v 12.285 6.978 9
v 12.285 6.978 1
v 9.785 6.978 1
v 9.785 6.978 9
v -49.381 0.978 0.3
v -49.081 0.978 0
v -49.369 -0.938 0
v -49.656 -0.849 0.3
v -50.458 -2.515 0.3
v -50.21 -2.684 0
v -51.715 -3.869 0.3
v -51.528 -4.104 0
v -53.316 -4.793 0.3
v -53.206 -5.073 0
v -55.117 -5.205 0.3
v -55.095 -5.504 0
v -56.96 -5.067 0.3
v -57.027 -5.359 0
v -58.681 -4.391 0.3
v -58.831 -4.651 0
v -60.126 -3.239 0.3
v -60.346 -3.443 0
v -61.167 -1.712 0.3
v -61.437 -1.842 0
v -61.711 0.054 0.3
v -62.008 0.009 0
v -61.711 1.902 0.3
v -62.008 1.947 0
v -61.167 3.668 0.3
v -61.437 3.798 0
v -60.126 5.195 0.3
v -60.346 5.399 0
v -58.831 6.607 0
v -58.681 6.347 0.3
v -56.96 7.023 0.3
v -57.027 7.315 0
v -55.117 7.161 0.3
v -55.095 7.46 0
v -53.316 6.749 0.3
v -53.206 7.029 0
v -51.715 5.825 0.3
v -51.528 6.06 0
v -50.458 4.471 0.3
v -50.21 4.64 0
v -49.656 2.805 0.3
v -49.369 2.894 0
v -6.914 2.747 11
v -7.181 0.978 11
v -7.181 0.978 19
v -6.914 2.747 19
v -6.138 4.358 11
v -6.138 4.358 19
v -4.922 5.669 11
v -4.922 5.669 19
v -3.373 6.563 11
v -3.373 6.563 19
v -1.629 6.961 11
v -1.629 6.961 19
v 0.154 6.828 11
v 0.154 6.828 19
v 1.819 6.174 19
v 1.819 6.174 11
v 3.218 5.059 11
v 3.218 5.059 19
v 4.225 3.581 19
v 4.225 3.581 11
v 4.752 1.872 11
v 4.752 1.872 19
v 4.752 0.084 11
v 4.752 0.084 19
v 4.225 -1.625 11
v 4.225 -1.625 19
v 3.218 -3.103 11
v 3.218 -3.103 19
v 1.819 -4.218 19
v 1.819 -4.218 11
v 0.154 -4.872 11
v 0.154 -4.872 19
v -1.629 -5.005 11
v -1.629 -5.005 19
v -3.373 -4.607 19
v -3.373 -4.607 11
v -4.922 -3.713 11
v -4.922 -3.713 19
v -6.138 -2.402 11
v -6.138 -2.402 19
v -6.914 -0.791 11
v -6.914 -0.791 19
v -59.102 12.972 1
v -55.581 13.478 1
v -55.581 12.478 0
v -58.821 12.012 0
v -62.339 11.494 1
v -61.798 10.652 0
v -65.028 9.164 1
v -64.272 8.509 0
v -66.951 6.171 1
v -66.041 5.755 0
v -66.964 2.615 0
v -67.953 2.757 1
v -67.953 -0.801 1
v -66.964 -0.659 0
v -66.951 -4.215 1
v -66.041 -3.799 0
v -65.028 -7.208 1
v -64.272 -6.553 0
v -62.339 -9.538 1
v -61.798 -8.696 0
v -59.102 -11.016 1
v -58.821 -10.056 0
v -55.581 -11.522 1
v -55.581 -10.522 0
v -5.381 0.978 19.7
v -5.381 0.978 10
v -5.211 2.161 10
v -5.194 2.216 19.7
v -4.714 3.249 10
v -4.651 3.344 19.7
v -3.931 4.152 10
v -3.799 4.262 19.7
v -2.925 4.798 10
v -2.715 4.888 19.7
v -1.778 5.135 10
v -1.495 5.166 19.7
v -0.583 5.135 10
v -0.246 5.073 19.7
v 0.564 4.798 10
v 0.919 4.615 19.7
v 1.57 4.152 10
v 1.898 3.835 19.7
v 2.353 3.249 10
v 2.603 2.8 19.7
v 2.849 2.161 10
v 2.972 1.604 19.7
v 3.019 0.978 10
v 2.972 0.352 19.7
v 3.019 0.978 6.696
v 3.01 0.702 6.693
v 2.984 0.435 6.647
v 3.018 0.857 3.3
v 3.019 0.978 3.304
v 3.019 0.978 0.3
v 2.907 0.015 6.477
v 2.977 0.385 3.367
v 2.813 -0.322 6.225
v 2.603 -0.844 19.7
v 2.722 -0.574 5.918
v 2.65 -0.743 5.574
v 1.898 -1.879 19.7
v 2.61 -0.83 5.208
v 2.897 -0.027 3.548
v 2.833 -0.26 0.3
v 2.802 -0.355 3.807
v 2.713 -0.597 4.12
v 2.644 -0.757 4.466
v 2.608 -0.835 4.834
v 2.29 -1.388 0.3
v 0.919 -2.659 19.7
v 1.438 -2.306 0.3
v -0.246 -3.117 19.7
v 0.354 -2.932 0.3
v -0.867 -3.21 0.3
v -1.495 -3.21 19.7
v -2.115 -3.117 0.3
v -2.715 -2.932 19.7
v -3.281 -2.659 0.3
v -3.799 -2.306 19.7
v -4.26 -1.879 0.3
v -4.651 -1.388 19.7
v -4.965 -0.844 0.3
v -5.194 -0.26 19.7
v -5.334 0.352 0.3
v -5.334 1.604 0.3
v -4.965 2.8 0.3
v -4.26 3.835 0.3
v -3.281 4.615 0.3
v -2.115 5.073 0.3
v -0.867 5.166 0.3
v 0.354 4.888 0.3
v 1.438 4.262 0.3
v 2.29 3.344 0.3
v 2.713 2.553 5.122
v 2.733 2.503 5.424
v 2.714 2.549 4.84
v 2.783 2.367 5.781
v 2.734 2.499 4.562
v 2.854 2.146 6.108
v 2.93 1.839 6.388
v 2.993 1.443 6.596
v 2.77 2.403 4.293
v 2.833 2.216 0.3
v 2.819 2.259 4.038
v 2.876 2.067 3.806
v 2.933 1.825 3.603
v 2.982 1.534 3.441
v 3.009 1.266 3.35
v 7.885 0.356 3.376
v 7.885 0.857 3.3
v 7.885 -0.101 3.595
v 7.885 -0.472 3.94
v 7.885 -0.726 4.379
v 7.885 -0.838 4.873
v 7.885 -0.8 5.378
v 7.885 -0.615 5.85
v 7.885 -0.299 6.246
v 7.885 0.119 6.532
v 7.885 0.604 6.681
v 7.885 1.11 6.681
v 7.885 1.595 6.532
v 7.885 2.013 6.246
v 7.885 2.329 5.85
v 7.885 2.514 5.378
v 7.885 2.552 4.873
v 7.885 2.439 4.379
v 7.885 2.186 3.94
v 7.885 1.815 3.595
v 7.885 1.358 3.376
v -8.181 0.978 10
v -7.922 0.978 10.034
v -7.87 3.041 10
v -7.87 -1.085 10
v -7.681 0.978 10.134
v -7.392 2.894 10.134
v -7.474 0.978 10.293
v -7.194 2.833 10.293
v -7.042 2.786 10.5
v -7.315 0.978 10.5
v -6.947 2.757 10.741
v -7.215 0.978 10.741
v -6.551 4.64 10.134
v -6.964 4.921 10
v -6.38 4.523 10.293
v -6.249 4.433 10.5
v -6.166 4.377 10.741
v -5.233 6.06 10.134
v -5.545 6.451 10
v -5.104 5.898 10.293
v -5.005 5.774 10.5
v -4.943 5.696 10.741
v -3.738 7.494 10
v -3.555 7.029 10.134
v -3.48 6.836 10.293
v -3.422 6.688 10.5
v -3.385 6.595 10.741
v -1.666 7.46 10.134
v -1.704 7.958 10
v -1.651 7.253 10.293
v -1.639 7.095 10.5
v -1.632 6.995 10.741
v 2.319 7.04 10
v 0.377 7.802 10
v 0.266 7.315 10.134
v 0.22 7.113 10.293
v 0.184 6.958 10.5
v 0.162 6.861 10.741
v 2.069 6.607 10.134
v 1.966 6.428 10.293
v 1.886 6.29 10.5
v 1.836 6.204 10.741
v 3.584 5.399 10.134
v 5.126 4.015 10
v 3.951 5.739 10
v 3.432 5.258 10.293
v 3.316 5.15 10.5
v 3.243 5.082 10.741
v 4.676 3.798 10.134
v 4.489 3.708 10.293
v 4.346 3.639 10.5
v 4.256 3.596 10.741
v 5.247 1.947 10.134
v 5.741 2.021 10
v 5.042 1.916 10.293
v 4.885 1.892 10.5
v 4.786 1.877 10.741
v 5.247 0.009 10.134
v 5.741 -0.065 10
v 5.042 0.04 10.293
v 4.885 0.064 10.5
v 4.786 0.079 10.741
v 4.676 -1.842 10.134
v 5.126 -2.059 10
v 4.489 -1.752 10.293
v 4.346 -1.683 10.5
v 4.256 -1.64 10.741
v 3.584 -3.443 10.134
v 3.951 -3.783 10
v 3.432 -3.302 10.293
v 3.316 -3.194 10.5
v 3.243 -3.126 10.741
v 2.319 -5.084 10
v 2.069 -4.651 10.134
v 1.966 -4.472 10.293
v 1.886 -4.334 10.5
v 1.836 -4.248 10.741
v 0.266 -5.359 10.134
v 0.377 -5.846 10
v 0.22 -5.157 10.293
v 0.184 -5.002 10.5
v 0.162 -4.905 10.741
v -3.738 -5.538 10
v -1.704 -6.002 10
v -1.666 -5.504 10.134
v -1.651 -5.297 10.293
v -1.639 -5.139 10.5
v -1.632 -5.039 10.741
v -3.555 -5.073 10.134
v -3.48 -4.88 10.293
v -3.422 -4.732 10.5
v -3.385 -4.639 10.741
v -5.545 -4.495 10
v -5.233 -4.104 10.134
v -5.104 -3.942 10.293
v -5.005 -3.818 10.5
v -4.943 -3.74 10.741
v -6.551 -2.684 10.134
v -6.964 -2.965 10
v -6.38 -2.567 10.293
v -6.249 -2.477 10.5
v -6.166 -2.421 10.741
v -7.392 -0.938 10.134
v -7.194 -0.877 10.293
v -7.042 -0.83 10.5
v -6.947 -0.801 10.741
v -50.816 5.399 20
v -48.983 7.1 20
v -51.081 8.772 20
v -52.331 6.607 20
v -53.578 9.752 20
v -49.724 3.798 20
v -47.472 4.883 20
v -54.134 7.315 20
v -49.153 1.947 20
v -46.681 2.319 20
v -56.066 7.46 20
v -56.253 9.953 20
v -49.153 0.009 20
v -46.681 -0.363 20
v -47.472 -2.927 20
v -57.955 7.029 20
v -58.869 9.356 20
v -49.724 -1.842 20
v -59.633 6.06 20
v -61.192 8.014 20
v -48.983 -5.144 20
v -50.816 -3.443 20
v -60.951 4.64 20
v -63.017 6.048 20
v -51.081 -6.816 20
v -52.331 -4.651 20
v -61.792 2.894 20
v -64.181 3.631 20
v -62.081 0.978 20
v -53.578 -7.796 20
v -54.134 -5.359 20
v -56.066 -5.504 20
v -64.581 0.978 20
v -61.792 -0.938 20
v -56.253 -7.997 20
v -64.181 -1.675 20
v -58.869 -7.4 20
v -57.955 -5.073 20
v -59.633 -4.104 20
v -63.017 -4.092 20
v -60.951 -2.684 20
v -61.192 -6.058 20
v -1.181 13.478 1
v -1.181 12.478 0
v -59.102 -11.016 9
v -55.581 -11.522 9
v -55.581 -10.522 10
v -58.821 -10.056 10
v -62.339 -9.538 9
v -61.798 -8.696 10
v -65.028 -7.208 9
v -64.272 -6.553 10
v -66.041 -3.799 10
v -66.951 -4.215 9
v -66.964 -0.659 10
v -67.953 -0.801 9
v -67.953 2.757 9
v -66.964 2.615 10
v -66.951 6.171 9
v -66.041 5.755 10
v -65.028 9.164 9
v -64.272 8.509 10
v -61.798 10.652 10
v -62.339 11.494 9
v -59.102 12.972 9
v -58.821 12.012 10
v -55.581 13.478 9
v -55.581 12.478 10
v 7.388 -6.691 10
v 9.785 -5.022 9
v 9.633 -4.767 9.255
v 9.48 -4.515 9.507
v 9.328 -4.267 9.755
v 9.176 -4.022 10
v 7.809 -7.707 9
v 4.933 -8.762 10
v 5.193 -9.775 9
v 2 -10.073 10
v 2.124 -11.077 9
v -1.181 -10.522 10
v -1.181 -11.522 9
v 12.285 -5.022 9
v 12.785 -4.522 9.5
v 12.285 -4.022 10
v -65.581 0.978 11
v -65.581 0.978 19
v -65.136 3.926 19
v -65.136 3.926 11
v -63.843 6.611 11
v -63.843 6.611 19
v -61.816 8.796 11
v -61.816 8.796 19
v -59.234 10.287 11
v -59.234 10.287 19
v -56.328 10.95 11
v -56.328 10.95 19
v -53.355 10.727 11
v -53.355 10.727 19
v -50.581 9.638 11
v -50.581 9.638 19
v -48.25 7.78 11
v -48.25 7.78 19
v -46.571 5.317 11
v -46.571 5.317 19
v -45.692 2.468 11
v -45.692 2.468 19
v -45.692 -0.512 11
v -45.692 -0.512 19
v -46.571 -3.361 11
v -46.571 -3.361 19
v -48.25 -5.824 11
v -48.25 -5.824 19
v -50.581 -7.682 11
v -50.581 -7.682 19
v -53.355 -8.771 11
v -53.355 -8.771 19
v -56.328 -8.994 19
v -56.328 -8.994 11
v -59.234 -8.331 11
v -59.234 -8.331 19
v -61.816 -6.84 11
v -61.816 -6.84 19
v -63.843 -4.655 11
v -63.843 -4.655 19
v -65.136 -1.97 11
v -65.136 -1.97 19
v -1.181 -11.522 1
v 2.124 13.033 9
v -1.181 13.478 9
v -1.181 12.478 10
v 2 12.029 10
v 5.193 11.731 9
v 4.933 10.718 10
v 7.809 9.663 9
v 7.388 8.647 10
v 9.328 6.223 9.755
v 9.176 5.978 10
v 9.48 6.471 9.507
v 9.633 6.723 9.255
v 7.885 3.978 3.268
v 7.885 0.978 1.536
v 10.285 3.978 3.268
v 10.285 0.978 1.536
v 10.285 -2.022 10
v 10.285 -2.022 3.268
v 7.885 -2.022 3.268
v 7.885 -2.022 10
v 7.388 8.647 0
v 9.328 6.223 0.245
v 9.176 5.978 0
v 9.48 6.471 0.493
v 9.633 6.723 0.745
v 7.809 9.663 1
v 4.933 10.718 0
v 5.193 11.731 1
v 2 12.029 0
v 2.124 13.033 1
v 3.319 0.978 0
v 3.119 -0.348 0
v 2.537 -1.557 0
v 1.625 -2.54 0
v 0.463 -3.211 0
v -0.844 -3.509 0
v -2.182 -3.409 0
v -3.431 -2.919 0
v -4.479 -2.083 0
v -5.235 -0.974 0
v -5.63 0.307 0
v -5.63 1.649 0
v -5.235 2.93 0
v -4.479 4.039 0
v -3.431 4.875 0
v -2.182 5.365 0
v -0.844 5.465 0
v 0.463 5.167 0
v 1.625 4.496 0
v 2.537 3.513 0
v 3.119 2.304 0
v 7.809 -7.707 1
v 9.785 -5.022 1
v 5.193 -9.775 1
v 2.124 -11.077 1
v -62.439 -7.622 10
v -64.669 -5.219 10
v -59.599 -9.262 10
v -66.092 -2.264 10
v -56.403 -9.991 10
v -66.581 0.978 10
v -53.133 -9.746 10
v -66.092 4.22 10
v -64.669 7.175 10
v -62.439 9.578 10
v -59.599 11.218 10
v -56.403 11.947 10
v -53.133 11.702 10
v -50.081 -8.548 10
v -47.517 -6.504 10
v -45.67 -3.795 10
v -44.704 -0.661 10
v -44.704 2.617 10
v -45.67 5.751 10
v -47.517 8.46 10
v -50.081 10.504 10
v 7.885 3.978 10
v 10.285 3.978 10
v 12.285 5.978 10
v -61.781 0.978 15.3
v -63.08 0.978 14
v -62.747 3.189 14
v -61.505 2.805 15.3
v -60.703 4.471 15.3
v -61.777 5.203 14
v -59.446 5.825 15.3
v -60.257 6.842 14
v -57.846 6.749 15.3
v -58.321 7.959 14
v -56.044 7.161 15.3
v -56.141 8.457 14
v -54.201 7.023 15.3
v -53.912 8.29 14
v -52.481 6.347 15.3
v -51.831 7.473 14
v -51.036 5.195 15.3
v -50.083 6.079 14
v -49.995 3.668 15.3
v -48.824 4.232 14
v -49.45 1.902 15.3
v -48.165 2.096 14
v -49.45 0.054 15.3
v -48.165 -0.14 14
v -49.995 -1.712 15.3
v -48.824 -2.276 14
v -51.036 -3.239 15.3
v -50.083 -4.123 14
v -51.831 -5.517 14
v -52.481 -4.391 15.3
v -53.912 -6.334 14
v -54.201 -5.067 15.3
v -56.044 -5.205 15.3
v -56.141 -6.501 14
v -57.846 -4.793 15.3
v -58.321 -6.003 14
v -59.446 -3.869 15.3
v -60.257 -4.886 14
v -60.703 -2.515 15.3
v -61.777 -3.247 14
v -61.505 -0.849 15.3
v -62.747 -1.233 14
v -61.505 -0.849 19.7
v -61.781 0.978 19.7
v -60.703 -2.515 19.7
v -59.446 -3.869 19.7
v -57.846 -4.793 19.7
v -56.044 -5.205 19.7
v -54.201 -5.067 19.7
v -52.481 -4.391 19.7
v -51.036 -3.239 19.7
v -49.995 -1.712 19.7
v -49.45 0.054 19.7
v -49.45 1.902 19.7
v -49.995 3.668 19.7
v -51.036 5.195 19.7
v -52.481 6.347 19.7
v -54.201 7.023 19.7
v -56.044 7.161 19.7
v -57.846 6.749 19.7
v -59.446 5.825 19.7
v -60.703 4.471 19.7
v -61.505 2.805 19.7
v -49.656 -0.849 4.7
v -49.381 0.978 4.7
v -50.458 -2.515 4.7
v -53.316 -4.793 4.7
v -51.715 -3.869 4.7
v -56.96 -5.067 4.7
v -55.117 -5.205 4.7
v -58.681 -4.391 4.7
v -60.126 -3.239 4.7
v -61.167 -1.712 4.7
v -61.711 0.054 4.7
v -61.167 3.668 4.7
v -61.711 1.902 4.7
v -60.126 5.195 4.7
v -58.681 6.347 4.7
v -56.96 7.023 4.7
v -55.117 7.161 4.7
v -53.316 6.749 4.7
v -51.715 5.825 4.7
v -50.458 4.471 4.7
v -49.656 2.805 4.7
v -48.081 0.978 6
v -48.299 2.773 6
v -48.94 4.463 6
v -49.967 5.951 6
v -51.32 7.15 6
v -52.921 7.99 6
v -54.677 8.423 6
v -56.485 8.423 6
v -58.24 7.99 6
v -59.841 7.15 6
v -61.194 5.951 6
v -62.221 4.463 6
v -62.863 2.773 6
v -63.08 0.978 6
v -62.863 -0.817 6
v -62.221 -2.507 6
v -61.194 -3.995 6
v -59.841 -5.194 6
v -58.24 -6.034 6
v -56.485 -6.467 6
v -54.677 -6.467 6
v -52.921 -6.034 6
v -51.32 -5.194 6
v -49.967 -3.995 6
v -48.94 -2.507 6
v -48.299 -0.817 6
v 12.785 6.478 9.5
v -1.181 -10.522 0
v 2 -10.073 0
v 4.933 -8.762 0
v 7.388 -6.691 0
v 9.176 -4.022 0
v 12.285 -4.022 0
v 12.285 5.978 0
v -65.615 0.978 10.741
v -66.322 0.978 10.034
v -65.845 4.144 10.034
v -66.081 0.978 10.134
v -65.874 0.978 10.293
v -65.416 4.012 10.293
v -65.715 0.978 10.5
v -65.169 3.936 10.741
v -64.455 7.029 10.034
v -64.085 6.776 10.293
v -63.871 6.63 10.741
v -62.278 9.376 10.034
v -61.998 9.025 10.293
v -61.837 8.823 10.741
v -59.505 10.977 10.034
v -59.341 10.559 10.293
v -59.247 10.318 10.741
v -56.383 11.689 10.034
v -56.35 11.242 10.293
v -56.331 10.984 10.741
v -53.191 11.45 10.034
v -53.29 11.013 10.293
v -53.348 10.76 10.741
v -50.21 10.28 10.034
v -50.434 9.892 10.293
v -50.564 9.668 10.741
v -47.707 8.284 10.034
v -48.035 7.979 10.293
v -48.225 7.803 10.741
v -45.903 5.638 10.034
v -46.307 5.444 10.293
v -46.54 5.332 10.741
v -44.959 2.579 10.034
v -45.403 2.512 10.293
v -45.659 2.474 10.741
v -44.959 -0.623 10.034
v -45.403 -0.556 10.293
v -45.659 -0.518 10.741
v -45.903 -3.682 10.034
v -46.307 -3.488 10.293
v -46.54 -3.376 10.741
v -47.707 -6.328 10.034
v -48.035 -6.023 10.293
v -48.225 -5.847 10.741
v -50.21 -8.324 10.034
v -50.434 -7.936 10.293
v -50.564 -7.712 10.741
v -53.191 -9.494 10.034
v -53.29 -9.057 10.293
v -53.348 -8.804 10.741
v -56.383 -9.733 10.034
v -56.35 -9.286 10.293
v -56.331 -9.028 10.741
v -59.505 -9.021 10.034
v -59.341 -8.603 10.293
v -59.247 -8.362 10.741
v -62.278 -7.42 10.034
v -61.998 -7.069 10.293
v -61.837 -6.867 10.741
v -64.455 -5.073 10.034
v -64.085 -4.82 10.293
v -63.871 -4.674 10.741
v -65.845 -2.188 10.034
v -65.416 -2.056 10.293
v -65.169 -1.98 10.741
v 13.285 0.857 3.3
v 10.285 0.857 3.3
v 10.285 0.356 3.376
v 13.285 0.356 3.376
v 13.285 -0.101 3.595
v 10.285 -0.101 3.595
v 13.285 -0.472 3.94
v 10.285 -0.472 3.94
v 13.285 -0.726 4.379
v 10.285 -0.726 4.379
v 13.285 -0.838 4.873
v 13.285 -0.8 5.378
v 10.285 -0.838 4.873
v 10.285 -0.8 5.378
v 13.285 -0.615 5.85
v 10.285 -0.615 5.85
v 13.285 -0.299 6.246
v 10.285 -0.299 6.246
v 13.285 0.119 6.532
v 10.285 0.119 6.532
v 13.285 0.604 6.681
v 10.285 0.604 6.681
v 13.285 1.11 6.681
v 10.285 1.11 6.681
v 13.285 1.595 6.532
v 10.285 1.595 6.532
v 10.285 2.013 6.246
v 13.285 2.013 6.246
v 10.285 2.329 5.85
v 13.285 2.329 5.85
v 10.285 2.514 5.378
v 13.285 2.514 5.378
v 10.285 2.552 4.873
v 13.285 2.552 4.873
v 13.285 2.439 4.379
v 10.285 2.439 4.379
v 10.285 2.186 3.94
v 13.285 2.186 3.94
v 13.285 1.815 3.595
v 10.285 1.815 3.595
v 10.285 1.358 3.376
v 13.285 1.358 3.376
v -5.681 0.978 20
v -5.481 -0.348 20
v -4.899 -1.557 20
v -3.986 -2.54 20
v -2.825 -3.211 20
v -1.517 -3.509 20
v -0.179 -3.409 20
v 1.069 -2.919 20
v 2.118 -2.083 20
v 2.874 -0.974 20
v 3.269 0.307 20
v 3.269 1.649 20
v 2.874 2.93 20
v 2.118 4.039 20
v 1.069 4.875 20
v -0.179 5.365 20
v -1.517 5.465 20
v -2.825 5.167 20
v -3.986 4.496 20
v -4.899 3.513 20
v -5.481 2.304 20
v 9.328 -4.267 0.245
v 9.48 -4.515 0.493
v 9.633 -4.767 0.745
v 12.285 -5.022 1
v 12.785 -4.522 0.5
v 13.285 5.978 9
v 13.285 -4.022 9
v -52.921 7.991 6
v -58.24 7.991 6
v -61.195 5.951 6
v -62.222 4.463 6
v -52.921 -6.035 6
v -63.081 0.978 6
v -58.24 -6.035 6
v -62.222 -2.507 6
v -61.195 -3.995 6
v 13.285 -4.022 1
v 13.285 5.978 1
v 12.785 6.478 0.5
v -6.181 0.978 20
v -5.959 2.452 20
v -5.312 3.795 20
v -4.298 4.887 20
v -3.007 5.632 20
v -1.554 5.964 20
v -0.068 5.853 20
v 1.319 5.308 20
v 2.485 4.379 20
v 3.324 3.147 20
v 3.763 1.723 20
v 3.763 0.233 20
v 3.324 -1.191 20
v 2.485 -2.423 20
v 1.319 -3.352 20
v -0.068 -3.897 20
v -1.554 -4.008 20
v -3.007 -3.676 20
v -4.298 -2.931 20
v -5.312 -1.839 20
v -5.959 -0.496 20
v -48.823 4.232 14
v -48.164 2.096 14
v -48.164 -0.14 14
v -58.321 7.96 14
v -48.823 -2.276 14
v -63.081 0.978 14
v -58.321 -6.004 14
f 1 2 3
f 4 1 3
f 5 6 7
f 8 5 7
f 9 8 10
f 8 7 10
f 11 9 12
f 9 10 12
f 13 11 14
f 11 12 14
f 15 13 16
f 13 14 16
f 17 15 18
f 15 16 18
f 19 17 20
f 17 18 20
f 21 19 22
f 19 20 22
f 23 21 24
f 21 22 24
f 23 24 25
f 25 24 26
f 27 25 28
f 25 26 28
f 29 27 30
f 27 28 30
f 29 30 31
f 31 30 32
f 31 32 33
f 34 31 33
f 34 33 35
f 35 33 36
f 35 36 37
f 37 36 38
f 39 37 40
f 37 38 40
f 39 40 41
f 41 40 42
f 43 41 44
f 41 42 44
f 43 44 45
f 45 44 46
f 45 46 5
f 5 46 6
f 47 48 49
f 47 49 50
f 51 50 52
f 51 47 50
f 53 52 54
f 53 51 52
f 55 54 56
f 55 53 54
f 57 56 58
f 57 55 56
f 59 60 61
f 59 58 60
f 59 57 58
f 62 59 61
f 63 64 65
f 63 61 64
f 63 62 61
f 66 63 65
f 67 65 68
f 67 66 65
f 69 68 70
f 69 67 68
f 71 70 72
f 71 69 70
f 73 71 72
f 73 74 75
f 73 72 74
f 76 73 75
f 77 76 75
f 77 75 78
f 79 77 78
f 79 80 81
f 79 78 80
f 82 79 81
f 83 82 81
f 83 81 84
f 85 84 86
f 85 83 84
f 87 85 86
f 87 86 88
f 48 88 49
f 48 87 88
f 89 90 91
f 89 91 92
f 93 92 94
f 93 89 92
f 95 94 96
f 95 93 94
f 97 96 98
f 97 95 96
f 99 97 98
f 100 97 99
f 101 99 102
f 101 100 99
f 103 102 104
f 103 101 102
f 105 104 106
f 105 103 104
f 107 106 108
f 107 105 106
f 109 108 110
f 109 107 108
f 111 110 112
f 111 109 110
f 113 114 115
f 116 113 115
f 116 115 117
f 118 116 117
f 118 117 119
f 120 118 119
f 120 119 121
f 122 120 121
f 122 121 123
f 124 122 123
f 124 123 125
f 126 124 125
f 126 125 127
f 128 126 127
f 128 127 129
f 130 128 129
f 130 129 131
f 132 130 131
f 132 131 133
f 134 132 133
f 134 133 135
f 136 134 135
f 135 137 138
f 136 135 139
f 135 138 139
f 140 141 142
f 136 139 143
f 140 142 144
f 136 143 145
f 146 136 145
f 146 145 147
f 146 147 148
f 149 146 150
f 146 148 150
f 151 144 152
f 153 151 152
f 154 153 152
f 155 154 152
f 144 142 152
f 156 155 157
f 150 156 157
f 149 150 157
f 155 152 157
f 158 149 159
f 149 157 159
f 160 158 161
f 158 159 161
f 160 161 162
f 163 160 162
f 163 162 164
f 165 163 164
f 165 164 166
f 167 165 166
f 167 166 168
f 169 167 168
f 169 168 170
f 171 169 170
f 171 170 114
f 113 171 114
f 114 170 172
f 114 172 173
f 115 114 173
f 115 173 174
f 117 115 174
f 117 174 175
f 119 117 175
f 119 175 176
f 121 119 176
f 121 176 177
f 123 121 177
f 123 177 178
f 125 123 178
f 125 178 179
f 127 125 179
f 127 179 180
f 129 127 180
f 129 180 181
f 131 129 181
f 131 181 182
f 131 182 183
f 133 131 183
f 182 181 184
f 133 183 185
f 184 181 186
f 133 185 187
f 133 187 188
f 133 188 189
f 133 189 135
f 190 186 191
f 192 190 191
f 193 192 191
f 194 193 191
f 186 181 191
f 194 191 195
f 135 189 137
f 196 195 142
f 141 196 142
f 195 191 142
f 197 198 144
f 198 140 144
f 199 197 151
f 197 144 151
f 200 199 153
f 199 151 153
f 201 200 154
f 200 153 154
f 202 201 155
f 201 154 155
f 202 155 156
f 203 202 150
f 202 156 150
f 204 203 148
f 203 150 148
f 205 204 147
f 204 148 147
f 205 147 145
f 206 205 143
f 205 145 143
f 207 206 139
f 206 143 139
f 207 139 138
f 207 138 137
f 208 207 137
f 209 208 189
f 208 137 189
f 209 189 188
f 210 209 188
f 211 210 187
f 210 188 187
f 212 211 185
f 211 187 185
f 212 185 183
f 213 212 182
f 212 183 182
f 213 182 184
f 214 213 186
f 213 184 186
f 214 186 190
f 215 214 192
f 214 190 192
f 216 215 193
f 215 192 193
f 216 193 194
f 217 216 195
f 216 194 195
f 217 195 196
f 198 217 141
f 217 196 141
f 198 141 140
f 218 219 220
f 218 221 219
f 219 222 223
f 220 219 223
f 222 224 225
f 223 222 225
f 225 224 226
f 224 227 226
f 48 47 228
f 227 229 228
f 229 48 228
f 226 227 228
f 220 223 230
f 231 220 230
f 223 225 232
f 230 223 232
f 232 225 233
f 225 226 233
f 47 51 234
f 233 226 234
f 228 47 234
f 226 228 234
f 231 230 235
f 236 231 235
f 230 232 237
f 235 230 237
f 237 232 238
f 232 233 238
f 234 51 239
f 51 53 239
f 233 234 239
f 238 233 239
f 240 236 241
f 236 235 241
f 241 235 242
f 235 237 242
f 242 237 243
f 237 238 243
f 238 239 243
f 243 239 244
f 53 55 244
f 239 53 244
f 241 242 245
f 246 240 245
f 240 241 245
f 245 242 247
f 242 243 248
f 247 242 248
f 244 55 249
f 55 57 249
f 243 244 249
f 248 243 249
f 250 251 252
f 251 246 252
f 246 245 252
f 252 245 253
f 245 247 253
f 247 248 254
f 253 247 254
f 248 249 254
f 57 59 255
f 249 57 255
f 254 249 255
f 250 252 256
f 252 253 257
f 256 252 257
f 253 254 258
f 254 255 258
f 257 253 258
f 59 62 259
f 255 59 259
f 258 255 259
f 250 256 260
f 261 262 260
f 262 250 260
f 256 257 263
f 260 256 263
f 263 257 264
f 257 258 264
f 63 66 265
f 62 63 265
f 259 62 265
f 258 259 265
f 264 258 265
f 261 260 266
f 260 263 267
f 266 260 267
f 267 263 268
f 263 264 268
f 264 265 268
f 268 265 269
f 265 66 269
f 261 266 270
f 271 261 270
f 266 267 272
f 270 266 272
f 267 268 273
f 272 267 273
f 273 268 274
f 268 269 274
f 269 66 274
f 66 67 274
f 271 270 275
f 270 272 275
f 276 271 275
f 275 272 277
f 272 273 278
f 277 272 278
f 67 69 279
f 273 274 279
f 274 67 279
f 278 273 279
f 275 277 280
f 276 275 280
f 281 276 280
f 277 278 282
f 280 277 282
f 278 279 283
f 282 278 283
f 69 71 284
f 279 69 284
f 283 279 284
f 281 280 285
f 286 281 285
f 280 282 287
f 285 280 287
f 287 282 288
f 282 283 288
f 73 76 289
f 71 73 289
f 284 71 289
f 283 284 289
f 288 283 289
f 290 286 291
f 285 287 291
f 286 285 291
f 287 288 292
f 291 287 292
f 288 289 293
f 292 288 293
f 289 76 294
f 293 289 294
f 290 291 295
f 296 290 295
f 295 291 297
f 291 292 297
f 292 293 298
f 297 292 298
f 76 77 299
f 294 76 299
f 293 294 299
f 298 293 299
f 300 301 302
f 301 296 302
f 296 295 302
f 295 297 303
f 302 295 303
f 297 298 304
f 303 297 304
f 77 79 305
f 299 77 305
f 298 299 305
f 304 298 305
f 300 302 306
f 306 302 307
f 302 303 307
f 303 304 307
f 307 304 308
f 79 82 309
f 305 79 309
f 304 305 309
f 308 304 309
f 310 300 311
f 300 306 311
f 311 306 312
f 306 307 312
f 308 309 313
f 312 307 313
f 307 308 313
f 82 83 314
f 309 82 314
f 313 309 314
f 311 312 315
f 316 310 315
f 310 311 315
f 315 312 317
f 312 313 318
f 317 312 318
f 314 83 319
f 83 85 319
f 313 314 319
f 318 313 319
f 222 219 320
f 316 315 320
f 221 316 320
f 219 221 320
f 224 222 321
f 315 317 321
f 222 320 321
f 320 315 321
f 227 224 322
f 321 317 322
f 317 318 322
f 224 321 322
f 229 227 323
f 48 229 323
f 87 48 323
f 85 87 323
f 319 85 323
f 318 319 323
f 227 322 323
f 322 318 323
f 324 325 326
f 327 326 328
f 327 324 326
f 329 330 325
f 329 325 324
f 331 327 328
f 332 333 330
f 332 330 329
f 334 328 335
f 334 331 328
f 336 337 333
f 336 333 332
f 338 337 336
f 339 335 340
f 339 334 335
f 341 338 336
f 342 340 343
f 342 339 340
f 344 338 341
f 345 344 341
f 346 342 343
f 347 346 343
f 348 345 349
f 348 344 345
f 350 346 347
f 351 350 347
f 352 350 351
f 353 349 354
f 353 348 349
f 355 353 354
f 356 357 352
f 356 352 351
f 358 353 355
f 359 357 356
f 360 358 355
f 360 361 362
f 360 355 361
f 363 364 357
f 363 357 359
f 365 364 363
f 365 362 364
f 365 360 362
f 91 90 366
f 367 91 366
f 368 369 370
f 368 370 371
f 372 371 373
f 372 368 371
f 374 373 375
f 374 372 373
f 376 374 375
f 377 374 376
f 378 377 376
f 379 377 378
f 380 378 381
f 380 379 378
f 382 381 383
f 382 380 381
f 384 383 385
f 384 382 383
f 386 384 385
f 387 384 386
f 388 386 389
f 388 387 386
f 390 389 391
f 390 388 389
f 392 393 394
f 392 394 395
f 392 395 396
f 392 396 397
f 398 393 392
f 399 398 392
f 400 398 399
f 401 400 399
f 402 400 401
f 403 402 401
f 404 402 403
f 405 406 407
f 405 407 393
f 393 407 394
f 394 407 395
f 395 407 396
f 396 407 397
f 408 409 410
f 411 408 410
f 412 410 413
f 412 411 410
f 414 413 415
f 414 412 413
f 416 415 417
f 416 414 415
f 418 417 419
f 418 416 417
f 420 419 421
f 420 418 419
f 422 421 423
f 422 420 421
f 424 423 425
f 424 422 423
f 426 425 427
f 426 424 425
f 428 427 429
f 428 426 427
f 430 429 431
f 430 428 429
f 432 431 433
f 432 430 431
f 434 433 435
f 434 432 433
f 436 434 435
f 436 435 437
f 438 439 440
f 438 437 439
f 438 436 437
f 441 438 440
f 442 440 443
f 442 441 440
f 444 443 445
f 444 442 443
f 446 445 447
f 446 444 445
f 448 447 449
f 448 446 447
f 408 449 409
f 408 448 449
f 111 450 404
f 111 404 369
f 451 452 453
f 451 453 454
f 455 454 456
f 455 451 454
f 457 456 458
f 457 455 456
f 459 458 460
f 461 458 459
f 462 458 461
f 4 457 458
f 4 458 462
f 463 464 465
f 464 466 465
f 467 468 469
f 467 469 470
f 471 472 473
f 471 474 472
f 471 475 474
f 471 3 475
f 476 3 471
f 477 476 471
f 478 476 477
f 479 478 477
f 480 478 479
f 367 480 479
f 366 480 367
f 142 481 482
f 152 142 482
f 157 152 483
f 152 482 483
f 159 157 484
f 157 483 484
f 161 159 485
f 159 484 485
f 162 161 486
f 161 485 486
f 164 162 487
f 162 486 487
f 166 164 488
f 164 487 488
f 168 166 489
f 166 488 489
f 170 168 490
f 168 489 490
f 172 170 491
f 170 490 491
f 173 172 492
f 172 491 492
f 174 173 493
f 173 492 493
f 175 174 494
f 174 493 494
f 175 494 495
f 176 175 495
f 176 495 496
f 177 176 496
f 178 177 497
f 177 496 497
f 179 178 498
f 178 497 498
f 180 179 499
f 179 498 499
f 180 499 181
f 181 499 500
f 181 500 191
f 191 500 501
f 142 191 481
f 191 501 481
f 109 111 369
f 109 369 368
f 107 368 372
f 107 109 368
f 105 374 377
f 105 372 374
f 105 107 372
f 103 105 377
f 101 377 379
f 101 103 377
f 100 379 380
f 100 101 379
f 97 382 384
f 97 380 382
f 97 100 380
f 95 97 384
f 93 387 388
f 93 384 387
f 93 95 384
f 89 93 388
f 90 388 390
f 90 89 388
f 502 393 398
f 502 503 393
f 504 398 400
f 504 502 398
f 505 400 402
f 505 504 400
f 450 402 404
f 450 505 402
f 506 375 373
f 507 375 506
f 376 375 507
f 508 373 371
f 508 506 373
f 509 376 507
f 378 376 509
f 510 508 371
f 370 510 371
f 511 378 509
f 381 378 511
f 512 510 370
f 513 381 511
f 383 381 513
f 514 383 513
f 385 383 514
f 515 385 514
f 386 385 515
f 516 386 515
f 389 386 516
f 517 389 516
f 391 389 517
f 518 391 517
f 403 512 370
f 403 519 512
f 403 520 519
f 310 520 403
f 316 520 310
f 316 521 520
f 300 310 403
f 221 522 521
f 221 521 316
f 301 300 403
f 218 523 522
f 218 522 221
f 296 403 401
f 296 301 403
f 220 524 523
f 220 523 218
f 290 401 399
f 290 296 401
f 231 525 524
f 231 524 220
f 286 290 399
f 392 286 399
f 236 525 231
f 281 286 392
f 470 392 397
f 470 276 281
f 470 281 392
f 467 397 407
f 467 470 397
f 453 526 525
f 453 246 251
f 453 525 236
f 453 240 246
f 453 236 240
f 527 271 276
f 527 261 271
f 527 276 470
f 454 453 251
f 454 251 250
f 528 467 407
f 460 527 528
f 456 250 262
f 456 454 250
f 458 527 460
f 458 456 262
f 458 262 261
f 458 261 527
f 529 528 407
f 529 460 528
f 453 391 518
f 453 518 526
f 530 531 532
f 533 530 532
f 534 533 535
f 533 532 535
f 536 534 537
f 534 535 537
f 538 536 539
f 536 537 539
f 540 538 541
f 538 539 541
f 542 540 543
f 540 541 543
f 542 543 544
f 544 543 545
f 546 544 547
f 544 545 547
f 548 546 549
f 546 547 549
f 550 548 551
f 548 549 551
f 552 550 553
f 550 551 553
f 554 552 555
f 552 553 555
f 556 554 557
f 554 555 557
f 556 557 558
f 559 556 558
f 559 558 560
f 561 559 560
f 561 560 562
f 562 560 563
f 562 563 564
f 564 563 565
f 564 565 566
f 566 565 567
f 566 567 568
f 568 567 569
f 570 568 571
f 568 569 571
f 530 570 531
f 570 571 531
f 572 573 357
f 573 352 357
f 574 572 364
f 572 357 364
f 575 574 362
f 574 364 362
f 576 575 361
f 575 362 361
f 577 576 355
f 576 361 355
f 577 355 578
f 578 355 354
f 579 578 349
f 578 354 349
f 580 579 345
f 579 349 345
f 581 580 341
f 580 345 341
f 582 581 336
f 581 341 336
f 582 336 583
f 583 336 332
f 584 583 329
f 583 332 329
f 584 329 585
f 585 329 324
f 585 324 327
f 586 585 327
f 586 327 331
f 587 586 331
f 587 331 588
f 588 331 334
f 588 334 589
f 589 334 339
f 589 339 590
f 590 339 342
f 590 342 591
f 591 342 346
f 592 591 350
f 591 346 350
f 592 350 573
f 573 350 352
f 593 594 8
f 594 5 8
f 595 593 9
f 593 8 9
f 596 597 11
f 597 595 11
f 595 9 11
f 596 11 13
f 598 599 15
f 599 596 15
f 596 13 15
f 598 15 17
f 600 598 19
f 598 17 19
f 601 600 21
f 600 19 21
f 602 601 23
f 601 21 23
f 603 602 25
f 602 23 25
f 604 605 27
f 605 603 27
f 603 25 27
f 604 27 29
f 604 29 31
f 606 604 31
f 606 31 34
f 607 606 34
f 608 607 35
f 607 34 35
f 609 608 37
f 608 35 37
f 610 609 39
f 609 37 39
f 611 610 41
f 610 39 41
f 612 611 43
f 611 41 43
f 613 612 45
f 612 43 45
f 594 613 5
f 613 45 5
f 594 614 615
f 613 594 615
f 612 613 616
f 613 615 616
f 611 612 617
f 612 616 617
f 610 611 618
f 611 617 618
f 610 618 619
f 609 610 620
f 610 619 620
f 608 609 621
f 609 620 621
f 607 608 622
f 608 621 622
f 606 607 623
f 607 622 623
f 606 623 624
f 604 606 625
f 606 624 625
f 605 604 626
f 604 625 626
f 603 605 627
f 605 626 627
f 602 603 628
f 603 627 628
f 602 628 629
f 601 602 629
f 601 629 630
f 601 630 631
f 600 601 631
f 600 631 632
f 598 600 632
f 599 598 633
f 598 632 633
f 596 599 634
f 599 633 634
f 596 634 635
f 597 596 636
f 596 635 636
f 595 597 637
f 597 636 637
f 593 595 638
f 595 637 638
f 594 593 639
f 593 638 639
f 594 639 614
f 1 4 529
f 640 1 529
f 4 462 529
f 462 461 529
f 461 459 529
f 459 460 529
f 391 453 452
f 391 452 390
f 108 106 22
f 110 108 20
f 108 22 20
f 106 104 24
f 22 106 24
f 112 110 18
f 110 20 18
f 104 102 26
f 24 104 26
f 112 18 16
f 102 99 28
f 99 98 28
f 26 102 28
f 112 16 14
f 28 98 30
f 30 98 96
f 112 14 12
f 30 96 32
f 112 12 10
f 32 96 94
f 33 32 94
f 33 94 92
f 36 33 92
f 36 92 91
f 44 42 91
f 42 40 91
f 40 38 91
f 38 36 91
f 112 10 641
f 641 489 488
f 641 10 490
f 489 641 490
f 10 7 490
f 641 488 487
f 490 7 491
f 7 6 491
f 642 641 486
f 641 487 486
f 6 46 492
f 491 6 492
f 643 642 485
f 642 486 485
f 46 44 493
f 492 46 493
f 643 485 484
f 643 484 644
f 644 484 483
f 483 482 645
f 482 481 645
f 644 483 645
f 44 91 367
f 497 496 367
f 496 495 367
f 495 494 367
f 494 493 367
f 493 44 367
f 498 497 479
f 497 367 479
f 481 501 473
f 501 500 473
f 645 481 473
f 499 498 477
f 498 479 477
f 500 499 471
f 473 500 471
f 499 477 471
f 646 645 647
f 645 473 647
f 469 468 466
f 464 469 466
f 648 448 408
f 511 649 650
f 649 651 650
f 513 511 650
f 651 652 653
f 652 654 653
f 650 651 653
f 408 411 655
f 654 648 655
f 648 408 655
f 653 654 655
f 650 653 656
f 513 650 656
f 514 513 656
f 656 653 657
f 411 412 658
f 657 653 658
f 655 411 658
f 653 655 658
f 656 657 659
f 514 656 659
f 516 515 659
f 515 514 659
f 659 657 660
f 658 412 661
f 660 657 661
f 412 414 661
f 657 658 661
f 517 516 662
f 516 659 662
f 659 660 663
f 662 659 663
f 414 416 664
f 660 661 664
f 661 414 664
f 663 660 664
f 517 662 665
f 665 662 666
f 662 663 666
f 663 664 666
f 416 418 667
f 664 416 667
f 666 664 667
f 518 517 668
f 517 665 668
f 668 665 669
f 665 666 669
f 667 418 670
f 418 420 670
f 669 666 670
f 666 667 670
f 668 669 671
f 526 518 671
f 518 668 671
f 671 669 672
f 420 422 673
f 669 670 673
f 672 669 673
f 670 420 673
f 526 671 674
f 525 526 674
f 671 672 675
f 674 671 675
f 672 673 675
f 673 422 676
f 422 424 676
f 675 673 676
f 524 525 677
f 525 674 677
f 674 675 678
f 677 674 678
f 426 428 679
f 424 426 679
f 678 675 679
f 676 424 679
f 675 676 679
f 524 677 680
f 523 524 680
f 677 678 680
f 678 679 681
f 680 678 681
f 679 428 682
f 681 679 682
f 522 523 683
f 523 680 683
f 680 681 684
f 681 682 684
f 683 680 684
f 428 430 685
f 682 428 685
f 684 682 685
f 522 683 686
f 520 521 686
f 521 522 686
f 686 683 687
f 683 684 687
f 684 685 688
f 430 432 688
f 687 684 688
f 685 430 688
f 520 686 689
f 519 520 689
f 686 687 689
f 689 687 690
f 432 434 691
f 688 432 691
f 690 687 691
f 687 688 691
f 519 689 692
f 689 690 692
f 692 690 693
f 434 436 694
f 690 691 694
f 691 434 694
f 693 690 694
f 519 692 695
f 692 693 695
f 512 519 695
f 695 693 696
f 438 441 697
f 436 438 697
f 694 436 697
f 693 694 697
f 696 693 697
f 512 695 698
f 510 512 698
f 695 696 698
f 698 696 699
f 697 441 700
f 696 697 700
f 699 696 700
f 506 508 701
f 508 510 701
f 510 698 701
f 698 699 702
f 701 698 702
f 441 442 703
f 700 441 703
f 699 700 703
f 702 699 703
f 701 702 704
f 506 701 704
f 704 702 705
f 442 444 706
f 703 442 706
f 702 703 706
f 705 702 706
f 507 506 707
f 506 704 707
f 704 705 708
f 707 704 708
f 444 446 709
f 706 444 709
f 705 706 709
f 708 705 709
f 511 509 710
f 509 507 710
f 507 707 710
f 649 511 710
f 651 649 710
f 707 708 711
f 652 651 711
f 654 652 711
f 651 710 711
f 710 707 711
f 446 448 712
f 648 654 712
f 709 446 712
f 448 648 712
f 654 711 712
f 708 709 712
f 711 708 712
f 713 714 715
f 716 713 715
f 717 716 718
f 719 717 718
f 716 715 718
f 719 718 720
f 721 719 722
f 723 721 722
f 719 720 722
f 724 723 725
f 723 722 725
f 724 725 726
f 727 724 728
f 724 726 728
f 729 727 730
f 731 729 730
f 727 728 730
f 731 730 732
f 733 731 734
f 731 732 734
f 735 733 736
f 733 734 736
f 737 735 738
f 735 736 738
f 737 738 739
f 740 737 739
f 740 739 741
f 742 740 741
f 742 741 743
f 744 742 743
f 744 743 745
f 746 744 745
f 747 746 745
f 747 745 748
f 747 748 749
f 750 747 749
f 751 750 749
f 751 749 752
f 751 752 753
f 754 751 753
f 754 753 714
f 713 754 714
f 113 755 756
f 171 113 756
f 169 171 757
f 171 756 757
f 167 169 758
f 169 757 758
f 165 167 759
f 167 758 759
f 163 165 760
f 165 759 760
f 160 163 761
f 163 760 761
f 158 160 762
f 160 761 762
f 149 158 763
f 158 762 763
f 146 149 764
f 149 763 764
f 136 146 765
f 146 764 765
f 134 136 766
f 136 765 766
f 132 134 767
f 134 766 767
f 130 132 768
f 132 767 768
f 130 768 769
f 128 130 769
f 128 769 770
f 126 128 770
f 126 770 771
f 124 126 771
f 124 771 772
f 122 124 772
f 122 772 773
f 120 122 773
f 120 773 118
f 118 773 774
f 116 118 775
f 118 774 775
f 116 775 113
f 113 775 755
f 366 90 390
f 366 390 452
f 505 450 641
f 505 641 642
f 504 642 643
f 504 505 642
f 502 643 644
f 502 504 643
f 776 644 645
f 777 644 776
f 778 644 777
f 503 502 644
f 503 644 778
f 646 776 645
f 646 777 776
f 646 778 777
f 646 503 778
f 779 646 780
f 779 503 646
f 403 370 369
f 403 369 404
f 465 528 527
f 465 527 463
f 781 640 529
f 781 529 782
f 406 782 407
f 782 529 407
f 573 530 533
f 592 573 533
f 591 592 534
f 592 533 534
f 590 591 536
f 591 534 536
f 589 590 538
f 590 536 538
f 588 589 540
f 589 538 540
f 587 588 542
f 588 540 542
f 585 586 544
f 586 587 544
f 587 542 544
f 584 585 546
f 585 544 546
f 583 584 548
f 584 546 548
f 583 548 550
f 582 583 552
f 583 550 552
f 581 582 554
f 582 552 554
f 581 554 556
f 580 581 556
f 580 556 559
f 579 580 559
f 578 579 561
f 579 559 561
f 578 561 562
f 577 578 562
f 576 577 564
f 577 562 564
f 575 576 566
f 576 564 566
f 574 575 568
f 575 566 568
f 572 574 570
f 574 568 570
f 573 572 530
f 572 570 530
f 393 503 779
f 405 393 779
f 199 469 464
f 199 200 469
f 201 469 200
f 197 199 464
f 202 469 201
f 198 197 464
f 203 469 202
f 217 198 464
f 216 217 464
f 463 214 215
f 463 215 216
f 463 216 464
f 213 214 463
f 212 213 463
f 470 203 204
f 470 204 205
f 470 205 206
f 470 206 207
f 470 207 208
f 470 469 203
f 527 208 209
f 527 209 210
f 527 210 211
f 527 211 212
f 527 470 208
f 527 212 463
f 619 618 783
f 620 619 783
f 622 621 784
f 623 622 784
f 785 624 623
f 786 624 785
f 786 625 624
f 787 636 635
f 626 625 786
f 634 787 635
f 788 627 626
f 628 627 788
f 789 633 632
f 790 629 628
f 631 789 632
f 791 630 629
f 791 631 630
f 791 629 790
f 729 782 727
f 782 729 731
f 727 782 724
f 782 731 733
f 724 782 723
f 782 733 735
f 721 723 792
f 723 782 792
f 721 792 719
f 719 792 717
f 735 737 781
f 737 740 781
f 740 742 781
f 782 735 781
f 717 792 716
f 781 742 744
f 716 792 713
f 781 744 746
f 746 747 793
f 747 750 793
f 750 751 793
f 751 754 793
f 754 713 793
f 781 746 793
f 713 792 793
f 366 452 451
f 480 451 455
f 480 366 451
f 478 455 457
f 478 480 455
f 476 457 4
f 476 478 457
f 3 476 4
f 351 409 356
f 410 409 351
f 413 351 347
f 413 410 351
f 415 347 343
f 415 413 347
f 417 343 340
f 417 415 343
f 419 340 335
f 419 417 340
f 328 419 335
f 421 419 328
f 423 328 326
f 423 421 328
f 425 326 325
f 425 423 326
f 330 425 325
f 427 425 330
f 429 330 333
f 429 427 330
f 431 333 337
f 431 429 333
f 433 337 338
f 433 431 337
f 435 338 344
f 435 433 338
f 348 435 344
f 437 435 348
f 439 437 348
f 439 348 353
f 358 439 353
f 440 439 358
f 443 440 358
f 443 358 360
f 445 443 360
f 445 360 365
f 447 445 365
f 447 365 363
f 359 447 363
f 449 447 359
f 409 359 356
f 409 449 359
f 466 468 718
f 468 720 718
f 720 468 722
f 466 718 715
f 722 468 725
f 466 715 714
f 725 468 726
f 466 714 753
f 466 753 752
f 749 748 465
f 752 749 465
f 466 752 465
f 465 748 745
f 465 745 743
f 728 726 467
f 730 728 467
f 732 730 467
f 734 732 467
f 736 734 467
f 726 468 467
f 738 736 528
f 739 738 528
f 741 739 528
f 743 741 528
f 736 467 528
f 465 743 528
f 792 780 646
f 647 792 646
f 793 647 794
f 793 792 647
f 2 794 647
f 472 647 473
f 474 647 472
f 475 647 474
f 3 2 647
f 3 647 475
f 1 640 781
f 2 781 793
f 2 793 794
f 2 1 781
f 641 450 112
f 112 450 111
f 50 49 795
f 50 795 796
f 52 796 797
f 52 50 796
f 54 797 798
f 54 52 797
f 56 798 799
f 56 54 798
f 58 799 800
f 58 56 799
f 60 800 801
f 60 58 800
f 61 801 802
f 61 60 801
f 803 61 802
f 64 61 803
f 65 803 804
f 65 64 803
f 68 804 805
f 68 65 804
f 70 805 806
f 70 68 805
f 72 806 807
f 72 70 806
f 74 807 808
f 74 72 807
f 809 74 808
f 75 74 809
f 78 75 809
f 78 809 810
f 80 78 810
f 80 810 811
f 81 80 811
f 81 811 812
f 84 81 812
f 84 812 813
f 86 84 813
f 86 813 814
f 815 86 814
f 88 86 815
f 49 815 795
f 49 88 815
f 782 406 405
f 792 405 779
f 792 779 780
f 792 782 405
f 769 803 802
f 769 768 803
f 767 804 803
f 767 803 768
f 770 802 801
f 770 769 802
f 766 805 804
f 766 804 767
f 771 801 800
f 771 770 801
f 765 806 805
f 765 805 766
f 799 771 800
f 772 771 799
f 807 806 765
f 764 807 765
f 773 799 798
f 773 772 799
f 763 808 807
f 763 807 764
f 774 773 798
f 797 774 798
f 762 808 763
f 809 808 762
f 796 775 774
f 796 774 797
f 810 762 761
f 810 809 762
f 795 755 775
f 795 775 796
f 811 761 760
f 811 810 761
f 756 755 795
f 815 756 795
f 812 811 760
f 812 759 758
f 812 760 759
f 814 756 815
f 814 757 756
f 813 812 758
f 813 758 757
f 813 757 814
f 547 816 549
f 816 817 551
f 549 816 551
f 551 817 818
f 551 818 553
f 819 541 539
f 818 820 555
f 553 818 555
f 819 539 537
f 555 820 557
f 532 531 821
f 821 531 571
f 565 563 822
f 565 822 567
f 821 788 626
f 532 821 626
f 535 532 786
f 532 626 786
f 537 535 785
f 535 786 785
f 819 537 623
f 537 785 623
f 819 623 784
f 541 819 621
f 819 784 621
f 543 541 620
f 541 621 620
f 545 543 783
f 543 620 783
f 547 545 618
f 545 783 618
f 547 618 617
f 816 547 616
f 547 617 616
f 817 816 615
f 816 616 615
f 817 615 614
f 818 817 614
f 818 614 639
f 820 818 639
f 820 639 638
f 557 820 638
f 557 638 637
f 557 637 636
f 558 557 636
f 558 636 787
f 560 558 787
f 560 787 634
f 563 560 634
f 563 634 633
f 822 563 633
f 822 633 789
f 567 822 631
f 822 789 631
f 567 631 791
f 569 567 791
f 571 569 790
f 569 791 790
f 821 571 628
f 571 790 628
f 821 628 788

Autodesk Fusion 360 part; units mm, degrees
sketch "Esquisse1" plane through (0, 0, 0) normal (0, 0, 1) x (1, 0, 0)
  circle A0 centre (-55.5807, 0.978) radius 6.2
  circle A1 centre (-1.1807, 0.978) radius 4.2
  line L0 (-55.5807, 13.478) -> (-1.1807, 13.478)
  line L1 (-1.1807, 13.478) -> (-1.1807, -11.522) construction
  line L2 (-1.1807, -11.522) -> (-55.5807, -11.522)
  line L3 (-55.5807, -11.522) -> (-55.5807, 13.478) construction
  arc A2 (-55.5807, 13.478) -> (-55.5807, -11.522) centre (-55.5807, 0.978) ccw
  line L4 (9.7852, -5.022) -> (13.2852, -5.022)
  line L5 (13.2852, -5.022) -> (13.2852, 6.978)
  line L6 (13.2852, 6.978) -> (9.7852, 6.978)
  arc A3 (-1.1807, -11.522) -> (9.7852, -5.022) centre (-1.1807, 0.978) ccw
  arc A4 (9.7852, 6.978) -> (-1.1807, 13.478) centre (-1.1807, 0.978) ccw
  dimension "d1" = 54.4
  dimension "d2" = 12.4
  dimension "d3" = 8.4
  dimension "d4" = 25
  dimension "d5" = 12.5
  dimension "d7" = 12
  dimension "d8" = 3.5
extrude "Extrusion1" add sketch "Esquisse1" along normal blind 10
sketch "Esquisse2" plane through (0, 0, 10) normal (0, 0, 1) x (-1, 0, 0)
  circle A0 centre (55.5807, -0.978) radius 6.2
  circle A1 centre (1.1807, -0.978) radius 4.2
  arc A2 (1.1807, 11.522) -> (-9.7852, 5.022) centre (1.1807, -0.978) ccw
  line L0 (-9.7852, 5.022) -> (-13.2852, 5.022)
  line L1 (-13.2852, 5.022) -> (-13.2852, -6.978)
  line L2 (-13.2852, -6.978) -> (-9.7852, -6.978)
  arc A3 (-9.7852, -6.978) -> (1.1807, -13.478) centre (1.1807, -0.978) ccw
  line L3 (1.1807, -13.478) -> (55.5807, -13.478)
  arc A4 (55.5807, -13.478) -> (55.5807, 11.522) centre (55.5807, -0.978) ccw
  line L4 (55.5807, 11.522) -> (1.1807, 11.522)
  circle A5 centre (55.5807, -0.978) radius 10
  circle A6 centre (1.1807, -0.978) radius 6
  circle A7 centre (55.5807, -0.978) radius 7.5
  dimension "d11" = 20
  dimension "d12" = 12
  dimension "d32" = 15
extrude "Extrusion4" add sketch "Esquisse2" along normal blind 10 contours A5 | A6 | A7
extrude "Extrusion5" cut sketch "Esquisse2" along normal mid plane 8 contours A7
chamfer "Chanfrein3" distance 1.3 angle 45 2 edges at (-61.3611, -1.264, 6) (-61.3611, 3.2201, 14)
ref_plane "Plan de construction2" through (10.2852, 0.978, 5) normal (1, 0, 0) x (0, 1, 0)
sketch "Esquisse3" plane through (10.2852, 0, 0) normal (1, 0, 0) x (0, 1, 0)
  line L0 (-5.022, 0) -> (6.978, 0)
  line L1 (6.978, 0) -> (6.978, 10)
  line L2 (6.978, 10) -> (-5.022, 10)
  line L3 (-5.022, 10) -> (-5.022, 0)
  line L4 (-2.022, 10) -> (3.978, 10)
  line L5 (3.978, 10) -> (3.978, 5)
  line L6 (3.978, 5) -> (-2.022, 5) construction
  line L7 (-2.022, 5) -> (-2.022, 10)
  line L8 (0.978, 5) -> (0.978, 1.9) construction
  line L9 (-2.022, 6.7321) -> (-2.022, 3.2679)
  line L10 (-2.022, 3.2679) -> (0.978, 1.5359)
  line L11 (0.978, 1.5359) -> (3.978, 3.2679)
  line L12 (3.978, 3.2679) -> (3.978, 6.7321)
  point P0 (0.978, 5)
  dimension "d15" = 3.1
  dimension "d16" = 5
  dimension "d17" = 6
  dimension "d18" = 12
  dimension "d19" = 3
extrude "Extrusion3" cut sketch "Esquisse3" against normal blind 2.4 contours L2 L4 L5 L7 L9 L10 L11 L12
hole "Perçage1" at (13.2852, 0.8569, 5) direction (-1, 0, 0) diameter 3.4 depth 11 tip angle 180
chamfer "Chanfrein1" distance 1 angle 45 16 edges at (5.1931, -9.7749, 10) (5.1931, 11.7309, 10) (-28.3807, 13.478, 10) (-68.0807, 0.978, 10) (-28.3807, -11.522, 10) (-28.3807, -11.522, 0) (-68.0807, 0.978, 0) (-28.3807, 13.478, 0) (5.1931, 11.7309, 0) (5.1931, -9.7749, 0) (11.5352, -5.022, 0) (11.5352, -5.022, 10) (13.2852, 0.978, 0) (13.2852, 0.978, 10) (11.5352, 6.978, 10) (11.5352, 6.978, 0)
chamfer "Chanfrein2" distance 1 angle 45 2 edges at (13.2852, 6.978, 5) (13.2852, -5.022, 5)
chamfer "Chanfrein4" distance 0.3 angle 45 4 edges at (-49.8002, -1.264, 20) (-61.3611, 3.2201, 0) (2.7351, -0.5407, 20) (-5.0964, 2.4968, 0)
fillet "Congé2" radius 1 2 edges at (-46.2574, -2.6381, 10) (4.4133, -1.1917, 10)
chamfer "Chanfrein5" distance 1 angle 45 2 edges at (4.4133, 3.1477, 20) (-46.2574, 4.5942, 20)
equation "d5 = d4 / 2"
equation "d9 = 10 mm"
equation "d19 = ( d18 - d17 ) / 2"
equation "d30 = d9"
